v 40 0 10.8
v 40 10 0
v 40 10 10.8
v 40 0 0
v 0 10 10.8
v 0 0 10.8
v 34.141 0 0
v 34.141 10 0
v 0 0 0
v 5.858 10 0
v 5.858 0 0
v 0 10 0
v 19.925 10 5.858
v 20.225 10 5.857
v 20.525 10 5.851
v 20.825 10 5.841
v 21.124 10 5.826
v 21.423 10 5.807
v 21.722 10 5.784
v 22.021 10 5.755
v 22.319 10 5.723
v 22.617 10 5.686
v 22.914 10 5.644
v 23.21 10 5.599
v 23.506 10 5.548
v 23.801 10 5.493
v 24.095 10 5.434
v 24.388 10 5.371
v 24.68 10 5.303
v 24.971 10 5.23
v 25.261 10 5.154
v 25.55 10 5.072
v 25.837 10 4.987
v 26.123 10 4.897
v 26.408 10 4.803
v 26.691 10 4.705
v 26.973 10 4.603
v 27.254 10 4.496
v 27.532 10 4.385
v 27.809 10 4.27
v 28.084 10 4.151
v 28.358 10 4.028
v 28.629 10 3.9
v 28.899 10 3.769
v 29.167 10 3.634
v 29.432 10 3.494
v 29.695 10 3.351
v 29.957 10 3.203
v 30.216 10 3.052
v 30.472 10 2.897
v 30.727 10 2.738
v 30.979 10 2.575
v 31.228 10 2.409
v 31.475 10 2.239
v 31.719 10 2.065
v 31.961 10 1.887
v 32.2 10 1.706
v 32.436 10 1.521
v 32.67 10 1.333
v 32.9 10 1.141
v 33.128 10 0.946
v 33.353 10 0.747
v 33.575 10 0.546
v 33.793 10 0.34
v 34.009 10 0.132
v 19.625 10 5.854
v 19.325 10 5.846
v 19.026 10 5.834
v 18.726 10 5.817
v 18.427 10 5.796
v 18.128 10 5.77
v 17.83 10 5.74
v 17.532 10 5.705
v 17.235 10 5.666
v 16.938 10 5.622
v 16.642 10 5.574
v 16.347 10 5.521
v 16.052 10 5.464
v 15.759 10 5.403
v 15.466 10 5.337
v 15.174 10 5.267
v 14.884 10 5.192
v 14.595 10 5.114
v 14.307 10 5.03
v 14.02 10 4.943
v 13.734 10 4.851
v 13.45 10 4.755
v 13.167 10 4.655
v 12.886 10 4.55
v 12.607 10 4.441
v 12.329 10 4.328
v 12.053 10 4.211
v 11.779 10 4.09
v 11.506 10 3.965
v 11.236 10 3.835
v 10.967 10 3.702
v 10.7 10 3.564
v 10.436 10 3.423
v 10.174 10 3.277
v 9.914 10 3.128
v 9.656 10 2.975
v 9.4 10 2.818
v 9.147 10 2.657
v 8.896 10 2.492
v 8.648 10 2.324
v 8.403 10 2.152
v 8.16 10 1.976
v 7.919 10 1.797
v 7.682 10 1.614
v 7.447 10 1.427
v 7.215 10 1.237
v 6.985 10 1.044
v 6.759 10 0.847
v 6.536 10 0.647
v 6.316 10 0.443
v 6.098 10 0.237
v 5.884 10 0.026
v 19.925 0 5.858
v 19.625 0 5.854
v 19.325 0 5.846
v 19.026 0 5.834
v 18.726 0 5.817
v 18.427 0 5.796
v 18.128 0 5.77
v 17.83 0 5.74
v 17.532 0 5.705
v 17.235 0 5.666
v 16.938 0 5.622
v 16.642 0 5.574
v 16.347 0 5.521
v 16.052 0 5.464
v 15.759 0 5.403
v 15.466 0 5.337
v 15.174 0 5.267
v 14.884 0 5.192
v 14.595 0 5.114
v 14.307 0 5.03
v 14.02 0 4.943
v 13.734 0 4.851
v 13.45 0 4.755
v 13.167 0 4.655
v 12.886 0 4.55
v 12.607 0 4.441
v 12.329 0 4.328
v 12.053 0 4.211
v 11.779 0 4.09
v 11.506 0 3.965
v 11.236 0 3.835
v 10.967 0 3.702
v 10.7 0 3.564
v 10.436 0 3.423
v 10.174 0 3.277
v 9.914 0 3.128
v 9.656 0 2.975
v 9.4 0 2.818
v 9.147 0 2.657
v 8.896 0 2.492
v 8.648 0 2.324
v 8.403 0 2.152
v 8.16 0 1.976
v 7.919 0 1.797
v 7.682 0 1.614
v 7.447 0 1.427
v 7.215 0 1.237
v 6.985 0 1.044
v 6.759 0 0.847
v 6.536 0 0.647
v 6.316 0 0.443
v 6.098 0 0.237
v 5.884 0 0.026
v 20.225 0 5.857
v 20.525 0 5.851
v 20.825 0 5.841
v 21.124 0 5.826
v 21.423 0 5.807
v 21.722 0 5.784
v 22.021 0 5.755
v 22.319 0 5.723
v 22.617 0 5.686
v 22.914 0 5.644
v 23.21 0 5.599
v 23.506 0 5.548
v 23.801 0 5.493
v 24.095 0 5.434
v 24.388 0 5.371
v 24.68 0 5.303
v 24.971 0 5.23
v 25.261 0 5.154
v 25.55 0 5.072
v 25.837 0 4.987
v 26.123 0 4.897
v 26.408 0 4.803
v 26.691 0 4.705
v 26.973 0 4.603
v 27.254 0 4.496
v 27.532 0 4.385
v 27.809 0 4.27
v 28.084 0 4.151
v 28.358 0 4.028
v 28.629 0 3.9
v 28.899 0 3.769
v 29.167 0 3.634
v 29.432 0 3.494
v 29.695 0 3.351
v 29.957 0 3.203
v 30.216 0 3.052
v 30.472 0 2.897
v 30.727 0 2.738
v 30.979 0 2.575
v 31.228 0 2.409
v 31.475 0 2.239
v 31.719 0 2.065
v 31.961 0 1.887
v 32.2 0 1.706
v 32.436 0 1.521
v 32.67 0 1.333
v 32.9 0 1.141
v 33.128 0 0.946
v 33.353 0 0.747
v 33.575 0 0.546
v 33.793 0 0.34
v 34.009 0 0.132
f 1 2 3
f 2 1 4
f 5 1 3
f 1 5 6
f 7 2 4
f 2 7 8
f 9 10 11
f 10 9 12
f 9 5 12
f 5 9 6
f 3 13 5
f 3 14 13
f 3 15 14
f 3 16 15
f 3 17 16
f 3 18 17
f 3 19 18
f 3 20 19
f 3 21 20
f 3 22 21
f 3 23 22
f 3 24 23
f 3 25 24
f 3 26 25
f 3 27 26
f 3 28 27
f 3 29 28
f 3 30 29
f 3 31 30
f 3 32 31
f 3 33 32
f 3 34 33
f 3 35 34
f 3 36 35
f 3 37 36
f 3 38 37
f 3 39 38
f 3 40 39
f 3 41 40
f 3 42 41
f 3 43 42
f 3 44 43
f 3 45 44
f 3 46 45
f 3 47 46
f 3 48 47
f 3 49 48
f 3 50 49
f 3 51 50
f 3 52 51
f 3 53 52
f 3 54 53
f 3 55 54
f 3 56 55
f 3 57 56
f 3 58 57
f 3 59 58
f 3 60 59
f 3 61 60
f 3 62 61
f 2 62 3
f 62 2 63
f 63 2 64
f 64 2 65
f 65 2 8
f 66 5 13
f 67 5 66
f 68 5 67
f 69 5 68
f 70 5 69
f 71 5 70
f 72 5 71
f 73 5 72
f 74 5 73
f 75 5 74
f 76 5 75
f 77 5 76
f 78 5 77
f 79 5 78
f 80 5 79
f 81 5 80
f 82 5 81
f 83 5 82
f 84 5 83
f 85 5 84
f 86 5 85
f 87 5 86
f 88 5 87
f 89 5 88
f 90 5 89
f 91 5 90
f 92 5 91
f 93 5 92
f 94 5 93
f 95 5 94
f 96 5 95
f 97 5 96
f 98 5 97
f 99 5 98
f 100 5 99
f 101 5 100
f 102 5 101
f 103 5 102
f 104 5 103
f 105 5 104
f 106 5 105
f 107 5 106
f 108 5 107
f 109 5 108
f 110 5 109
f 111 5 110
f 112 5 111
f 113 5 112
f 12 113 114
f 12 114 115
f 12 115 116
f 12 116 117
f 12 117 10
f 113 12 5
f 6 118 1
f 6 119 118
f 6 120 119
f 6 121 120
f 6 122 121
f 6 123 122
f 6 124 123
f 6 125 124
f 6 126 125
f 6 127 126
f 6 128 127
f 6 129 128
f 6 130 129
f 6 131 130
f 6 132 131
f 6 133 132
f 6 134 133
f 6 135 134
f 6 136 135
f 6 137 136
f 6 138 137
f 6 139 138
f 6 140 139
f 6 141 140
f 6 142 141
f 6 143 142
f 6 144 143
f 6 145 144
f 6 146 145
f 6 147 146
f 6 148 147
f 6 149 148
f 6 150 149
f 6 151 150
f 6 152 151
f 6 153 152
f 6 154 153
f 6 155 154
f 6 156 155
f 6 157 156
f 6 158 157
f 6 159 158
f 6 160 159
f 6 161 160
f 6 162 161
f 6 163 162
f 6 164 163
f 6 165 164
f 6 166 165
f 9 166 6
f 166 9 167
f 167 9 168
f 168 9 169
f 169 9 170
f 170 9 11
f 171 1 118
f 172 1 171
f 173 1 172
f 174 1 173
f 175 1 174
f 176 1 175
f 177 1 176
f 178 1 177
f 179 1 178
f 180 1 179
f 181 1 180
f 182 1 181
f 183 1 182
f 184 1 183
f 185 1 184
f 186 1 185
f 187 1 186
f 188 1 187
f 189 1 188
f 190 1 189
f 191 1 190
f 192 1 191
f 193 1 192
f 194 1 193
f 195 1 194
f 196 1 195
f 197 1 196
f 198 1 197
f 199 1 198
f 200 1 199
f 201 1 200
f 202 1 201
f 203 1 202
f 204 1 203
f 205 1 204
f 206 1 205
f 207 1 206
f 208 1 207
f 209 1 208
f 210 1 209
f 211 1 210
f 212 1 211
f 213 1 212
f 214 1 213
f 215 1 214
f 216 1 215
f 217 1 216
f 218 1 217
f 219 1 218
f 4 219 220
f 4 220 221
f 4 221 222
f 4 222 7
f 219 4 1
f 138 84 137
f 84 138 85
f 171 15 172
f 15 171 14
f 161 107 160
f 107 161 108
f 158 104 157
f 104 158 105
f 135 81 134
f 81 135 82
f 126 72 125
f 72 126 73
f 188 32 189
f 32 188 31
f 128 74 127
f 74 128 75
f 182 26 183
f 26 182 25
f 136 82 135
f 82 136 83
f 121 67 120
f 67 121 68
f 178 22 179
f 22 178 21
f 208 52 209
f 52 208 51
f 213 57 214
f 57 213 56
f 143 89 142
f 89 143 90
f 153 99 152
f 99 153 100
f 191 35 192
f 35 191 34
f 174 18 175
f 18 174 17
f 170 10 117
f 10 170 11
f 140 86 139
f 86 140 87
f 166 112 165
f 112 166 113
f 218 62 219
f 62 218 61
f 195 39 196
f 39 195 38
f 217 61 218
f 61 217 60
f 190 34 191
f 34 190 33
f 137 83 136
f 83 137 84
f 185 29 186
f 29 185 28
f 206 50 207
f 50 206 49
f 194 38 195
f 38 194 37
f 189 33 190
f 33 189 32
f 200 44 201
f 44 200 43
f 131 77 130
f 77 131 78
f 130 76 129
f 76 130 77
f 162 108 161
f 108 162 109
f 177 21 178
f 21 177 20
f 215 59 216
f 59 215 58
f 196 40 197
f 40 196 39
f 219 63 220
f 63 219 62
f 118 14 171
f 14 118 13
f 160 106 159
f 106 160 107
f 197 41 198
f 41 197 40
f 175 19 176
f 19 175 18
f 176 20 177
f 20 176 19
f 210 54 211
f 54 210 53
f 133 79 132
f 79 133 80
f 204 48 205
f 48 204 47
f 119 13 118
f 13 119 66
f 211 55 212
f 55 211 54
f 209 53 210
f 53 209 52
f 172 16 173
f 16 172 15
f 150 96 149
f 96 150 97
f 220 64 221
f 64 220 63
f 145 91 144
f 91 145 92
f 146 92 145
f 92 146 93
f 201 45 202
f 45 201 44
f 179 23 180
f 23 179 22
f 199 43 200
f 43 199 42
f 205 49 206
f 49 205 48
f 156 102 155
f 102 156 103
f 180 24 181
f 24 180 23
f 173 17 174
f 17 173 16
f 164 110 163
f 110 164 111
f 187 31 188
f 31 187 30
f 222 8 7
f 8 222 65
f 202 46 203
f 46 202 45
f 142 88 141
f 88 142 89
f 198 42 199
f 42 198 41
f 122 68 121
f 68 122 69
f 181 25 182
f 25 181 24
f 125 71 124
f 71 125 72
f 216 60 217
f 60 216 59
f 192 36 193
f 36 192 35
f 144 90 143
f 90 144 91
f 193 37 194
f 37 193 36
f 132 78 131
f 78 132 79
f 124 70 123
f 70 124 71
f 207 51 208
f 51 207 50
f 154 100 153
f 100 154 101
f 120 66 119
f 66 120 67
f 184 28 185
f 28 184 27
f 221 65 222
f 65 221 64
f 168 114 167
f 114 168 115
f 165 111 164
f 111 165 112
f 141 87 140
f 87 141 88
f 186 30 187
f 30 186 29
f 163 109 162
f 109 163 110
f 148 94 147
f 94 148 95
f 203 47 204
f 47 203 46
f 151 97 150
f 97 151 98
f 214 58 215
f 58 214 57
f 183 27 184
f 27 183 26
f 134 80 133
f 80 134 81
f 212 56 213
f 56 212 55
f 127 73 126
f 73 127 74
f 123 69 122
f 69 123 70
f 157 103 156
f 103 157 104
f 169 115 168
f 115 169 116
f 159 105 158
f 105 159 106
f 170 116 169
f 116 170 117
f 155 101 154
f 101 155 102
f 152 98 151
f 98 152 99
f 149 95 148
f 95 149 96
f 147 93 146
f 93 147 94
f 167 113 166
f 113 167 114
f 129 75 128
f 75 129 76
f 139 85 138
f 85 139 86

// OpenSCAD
$fa = .01;
$fs = $preview ? 5 : .3;

/*customizer*/

// 1.2 works for layer height .05 .1 .15 .2 .3 .4
layer_height = 1.2;
thin_wall_thickness=.45;
layers_per_step=10;
steps=9;
width = 40;
depth=10;

/*shortcuts*/

twt=thin_wall_thickness;

/*calculated*/
step_height = layers_per_step * layer_height;

module support(){
	translate([0,0,-layer_height/2])
		difference(){
			cube([depth-2*twt,depth-2*twt,layer_height], center=true);
			cube([depth-4*twt,depth-4*twt,layer_height+.2], center=true);
			cube([twt,depth,layer_height+.2], center=true);
			cube([depth,twt,layer_height+.2], center=true);
		}
	}
module step(){
	r=(width/2);
	difference(){
		cube([width,depth,step_height-layer_height]);
		#translate([width/2,-.1,-r/sqrt(2)])
			rotate([-90,0,0])
			cylinder(r=r,h=depth+.2);
	}
}

step();
